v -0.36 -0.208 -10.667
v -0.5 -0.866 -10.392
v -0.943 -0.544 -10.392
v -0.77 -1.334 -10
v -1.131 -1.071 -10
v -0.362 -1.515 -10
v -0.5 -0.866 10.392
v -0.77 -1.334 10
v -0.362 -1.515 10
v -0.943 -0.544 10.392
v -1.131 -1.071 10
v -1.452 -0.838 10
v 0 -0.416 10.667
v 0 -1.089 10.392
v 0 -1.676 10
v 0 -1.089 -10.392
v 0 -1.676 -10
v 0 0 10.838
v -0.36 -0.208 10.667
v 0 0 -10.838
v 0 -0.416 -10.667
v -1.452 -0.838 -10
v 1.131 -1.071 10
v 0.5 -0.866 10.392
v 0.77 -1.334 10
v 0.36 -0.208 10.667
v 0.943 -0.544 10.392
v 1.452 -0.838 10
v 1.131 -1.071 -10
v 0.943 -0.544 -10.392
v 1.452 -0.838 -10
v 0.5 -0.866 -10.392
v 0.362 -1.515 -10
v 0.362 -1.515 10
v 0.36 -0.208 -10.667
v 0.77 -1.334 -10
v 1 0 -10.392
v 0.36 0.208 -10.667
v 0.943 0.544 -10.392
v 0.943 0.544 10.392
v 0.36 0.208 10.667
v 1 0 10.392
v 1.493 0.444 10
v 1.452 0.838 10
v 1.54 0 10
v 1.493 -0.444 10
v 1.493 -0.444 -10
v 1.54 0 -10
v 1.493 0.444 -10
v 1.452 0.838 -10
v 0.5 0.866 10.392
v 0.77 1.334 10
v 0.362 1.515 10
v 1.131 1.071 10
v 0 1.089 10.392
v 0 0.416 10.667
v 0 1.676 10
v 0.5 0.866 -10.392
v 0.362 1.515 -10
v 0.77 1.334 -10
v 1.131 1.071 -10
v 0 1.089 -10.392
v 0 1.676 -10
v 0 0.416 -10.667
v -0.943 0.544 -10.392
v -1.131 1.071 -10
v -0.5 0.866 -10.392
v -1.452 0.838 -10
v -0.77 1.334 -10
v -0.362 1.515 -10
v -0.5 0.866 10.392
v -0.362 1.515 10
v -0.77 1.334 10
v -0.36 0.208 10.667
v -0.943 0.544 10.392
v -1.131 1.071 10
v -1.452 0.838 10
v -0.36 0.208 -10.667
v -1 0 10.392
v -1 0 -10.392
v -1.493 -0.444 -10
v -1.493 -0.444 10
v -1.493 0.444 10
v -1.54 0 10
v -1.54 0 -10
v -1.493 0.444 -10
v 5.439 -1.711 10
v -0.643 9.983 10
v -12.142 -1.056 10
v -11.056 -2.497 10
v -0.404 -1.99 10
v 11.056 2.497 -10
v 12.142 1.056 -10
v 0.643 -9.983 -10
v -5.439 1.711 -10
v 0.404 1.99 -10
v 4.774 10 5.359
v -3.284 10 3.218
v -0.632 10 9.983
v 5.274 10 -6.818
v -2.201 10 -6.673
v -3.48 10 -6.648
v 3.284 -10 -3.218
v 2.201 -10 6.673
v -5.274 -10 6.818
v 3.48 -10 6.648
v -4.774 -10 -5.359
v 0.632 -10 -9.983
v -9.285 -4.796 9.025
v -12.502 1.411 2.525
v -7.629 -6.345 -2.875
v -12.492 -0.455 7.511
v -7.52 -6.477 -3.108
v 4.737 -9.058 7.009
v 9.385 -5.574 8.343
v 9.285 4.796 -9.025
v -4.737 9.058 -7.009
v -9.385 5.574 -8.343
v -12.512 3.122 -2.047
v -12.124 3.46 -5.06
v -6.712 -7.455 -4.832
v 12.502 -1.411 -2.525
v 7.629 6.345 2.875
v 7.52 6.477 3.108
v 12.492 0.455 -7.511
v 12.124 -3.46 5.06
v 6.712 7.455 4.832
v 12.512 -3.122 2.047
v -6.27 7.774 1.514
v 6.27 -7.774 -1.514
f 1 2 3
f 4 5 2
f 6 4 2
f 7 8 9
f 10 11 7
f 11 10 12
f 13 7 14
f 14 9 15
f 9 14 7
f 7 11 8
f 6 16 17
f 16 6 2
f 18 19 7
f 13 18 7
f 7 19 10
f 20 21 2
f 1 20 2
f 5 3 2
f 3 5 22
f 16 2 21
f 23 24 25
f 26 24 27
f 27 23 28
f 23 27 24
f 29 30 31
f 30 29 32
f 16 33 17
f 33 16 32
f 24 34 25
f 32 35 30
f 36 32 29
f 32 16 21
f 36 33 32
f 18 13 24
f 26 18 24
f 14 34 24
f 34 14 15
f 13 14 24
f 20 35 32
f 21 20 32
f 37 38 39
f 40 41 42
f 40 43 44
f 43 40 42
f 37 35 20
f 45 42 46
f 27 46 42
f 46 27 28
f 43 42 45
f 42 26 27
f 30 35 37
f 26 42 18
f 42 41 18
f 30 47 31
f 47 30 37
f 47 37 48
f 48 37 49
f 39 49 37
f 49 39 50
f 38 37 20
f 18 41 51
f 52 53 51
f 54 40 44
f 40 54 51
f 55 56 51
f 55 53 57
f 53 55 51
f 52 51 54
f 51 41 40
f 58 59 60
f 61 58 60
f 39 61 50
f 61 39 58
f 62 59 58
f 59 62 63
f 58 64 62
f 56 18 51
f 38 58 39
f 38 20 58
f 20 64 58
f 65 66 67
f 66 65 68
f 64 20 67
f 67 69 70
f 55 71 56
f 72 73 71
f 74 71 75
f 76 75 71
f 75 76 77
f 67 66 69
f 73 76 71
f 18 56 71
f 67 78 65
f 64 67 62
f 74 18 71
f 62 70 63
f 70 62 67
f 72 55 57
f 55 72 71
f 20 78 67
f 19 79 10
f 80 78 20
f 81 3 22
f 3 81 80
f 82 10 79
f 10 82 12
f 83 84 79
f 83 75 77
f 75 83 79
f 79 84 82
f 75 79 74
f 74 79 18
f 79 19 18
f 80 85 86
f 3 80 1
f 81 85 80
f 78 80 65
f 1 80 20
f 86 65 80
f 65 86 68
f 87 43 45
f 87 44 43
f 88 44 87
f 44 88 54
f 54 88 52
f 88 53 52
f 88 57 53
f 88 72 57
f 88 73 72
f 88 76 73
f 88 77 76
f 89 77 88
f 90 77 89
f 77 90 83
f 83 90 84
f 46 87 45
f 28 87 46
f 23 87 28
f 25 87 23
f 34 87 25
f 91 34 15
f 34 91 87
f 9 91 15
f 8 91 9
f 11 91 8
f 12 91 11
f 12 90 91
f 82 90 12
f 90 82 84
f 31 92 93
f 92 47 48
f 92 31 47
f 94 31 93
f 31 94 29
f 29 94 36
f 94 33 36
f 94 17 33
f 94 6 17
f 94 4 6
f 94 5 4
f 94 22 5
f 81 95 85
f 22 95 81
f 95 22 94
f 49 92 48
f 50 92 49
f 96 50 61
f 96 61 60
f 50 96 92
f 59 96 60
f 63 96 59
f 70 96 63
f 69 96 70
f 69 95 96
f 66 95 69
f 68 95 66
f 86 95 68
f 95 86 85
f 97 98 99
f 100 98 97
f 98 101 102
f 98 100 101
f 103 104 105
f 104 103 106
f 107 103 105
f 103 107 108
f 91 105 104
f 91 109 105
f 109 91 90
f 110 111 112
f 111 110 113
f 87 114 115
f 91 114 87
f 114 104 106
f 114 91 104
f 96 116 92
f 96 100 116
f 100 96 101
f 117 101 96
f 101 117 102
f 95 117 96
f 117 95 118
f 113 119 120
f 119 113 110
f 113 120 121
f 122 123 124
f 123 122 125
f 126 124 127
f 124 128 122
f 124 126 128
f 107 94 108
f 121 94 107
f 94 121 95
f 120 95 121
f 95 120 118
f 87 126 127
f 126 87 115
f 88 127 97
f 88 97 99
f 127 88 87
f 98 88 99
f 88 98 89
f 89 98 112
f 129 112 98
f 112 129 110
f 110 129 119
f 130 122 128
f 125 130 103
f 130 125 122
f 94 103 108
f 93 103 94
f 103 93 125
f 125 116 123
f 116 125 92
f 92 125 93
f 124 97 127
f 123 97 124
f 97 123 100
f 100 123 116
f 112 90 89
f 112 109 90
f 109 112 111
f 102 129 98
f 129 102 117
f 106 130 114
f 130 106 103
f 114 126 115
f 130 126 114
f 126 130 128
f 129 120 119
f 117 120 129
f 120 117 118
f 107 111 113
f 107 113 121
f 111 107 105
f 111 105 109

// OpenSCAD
intersection_for(n = [1 : 6])
{
    rotate([0, 0, n * 60])
        {
            translate([5, 0, 0])
                sphere(r = 12);
        }
}

intersection_for(i = [[0, 0, 0],
        [10, 20, 300],
        [200, 40, 57],
        [20, 88, 57]])
{
    rotate(i)
        cube([100, 20, 20], center = true);
}
